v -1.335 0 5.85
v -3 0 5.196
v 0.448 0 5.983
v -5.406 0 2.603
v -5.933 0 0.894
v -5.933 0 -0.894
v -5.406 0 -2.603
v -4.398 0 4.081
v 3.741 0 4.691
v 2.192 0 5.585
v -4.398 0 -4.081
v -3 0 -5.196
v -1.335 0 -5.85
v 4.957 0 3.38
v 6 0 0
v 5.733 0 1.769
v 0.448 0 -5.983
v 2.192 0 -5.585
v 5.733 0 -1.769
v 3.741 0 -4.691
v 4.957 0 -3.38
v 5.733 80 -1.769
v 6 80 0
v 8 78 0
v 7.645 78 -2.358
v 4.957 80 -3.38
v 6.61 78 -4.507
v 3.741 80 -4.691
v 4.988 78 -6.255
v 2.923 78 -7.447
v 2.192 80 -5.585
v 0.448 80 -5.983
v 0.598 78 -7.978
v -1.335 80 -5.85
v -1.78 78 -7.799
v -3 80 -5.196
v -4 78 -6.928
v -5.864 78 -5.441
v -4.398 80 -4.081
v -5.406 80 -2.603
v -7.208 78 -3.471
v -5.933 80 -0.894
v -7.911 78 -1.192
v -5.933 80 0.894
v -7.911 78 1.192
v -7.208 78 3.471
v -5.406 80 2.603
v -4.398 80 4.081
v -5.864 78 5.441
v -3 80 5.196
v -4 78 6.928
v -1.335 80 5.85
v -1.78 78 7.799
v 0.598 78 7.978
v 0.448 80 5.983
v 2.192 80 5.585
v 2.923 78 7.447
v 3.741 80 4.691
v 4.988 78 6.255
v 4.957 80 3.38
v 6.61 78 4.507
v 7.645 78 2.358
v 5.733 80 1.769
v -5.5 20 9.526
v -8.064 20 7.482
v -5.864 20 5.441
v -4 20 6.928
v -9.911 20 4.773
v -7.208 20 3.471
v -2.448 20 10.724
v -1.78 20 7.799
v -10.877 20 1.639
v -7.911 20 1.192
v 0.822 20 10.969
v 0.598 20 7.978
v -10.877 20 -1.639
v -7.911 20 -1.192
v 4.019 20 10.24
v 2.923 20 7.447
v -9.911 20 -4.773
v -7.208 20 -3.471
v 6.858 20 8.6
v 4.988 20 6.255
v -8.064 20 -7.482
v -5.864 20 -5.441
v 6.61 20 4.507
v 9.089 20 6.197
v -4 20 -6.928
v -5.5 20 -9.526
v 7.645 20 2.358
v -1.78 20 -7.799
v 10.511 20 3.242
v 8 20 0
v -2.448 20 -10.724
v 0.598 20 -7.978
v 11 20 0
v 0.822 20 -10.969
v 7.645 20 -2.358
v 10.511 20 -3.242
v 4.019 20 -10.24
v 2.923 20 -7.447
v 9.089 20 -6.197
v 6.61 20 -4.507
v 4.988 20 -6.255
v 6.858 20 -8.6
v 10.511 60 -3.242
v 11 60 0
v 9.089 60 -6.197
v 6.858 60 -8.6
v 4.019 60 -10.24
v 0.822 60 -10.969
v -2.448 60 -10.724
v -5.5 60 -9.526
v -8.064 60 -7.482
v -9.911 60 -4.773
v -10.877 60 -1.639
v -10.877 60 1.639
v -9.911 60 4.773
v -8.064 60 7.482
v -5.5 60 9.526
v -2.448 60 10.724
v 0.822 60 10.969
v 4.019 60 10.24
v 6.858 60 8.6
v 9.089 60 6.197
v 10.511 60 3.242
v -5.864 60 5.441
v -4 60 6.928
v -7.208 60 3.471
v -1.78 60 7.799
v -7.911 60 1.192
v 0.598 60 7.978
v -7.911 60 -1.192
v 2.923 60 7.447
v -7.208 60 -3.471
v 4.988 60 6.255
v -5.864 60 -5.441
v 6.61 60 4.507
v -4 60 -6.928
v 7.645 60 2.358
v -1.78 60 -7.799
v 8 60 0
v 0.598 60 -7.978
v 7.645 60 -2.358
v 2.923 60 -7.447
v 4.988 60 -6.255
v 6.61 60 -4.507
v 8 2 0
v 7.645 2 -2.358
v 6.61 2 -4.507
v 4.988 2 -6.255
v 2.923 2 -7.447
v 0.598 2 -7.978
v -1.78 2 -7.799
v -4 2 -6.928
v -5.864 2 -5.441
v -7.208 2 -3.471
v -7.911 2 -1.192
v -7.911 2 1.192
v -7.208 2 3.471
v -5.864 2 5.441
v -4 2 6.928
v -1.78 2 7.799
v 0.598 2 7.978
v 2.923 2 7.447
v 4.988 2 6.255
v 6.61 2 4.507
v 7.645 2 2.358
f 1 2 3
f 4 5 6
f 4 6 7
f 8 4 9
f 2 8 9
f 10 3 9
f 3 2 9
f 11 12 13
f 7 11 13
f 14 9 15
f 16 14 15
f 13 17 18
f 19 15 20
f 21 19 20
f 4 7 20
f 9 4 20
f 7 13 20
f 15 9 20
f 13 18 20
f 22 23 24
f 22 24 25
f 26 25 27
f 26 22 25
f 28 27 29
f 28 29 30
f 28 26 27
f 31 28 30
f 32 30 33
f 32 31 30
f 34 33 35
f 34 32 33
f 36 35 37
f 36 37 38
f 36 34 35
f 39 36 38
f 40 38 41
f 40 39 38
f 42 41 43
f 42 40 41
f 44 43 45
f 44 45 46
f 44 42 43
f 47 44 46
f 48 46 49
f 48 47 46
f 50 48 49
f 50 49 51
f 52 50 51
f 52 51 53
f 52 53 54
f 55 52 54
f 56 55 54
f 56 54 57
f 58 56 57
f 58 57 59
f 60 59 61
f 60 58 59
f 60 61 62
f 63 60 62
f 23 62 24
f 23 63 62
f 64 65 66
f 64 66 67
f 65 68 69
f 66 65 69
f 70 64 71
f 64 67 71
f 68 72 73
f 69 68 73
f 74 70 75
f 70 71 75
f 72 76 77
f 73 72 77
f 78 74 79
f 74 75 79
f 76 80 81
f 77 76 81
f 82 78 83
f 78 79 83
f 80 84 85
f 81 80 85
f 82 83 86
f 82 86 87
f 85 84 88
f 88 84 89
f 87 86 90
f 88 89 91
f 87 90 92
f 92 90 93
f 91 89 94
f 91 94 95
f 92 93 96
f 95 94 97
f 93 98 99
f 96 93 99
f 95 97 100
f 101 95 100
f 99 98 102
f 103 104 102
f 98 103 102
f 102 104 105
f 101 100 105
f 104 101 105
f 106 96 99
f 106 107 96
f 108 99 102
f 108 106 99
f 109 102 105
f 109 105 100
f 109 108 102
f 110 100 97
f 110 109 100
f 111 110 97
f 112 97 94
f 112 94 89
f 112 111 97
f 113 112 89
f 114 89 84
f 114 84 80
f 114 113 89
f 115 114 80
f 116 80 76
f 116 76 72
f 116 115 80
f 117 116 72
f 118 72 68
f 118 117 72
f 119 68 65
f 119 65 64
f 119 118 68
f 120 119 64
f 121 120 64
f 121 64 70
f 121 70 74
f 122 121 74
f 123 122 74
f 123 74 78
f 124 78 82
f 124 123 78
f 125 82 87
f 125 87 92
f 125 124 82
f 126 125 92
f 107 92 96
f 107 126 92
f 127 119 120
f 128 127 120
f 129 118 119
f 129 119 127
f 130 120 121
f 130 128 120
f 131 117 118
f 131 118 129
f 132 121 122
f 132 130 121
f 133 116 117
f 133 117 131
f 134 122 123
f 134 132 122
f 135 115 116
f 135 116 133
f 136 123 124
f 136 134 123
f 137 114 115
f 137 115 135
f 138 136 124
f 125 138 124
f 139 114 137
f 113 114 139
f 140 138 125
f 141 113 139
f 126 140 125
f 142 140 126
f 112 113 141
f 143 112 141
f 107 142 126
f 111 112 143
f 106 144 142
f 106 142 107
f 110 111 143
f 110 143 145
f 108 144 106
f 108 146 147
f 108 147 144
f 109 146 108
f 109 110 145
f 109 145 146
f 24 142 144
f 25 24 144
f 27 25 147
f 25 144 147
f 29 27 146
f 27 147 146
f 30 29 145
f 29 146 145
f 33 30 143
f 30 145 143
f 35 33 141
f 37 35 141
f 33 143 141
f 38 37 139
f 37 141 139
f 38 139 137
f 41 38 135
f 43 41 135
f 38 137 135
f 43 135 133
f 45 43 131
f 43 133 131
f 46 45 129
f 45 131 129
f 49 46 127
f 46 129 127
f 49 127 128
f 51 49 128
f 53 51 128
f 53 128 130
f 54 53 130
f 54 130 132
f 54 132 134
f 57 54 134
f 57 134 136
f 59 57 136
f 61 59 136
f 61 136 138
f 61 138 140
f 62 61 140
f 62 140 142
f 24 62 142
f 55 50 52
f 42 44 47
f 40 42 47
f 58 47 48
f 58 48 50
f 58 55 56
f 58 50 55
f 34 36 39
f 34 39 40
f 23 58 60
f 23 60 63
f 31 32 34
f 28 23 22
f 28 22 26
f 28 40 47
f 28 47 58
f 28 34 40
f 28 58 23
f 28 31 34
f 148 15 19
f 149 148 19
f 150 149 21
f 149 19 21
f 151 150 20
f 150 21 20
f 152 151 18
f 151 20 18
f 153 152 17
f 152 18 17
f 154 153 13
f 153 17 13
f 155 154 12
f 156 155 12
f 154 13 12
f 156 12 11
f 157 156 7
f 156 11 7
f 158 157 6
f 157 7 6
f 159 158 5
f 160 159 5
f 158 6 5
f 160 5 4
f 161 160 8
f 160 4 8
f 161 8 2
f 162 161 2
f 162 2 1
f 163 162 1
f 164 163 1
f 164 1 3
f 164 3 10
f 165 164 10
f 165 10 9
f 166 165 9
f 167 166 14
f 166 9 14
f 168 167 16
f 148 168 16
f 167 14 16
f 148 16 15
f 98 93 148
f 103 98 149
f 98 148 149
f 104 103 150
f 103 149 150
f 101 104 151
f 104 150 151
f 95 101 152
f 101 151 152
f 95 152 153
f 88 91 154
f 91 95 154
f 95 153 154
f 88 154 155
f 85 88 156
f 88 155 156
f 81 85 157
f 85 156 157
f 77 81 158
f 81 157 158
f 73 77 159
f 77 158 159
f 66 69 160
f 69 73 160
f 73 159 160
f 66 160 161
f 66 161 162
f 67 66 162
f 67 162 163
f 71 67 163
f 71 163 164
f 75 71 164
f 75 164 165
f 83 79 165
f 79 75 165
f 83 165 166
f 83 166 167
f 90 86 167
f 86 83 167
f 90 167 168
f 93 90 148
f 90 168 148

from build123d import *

# Parameters (mm, degrees)
CROQUIS1_R              = 8
SALIENTE_EXTRUIR1_DEPTH = 80
CROQUIS2_R              = 11
SALIENTE_EXTRUIR2_DEPTH = 20
CHAFL_N1_SIZE           = 2
CHAFL_N2_SIZE           = 2


with BuildPart() as part:
    # Croquis1 → Saliente-Extruir1 (new body)
    with BuildSketch(Plane(origin=(0, 0, 0), x_dir=(1, 0, 0), z_dir=(0, 1, 0))):
        Circle(CROQUIS1_R)
    extrude(amount=SALIENTE_EXTRUIR1_DEPTH)

    # Croquis2 → Saliente-Extruir2 (add, symmetric)
    with BuildSketch(Plane(origin=(0, 40, 0), x_dir=(1, 0, 0), z_dir=(0, 1, 0))):
        Circle(CROQUIS2_R)
    extrude(amount=SALIENTE_EXTRUIR2_DEPTH, both=True)

    # Chaflán1
    chafl_n1_edges = [part.edges().sort_by_distance(p)[0] for p in [
        (-8, 80, 0),
    ]]
    chamfer(chafl_n1_edges, length=CHAFL_N1_SIZE)

    # Chaflán2
    chafl_n2_edges = [part.edges().sort_by_distance(p)[0] for p in [
        (-8, 0, 0),
    ]]
    chamfer(chafl_n2_edges, length=CHAFL_N2_SIZE)


solid = part.part
